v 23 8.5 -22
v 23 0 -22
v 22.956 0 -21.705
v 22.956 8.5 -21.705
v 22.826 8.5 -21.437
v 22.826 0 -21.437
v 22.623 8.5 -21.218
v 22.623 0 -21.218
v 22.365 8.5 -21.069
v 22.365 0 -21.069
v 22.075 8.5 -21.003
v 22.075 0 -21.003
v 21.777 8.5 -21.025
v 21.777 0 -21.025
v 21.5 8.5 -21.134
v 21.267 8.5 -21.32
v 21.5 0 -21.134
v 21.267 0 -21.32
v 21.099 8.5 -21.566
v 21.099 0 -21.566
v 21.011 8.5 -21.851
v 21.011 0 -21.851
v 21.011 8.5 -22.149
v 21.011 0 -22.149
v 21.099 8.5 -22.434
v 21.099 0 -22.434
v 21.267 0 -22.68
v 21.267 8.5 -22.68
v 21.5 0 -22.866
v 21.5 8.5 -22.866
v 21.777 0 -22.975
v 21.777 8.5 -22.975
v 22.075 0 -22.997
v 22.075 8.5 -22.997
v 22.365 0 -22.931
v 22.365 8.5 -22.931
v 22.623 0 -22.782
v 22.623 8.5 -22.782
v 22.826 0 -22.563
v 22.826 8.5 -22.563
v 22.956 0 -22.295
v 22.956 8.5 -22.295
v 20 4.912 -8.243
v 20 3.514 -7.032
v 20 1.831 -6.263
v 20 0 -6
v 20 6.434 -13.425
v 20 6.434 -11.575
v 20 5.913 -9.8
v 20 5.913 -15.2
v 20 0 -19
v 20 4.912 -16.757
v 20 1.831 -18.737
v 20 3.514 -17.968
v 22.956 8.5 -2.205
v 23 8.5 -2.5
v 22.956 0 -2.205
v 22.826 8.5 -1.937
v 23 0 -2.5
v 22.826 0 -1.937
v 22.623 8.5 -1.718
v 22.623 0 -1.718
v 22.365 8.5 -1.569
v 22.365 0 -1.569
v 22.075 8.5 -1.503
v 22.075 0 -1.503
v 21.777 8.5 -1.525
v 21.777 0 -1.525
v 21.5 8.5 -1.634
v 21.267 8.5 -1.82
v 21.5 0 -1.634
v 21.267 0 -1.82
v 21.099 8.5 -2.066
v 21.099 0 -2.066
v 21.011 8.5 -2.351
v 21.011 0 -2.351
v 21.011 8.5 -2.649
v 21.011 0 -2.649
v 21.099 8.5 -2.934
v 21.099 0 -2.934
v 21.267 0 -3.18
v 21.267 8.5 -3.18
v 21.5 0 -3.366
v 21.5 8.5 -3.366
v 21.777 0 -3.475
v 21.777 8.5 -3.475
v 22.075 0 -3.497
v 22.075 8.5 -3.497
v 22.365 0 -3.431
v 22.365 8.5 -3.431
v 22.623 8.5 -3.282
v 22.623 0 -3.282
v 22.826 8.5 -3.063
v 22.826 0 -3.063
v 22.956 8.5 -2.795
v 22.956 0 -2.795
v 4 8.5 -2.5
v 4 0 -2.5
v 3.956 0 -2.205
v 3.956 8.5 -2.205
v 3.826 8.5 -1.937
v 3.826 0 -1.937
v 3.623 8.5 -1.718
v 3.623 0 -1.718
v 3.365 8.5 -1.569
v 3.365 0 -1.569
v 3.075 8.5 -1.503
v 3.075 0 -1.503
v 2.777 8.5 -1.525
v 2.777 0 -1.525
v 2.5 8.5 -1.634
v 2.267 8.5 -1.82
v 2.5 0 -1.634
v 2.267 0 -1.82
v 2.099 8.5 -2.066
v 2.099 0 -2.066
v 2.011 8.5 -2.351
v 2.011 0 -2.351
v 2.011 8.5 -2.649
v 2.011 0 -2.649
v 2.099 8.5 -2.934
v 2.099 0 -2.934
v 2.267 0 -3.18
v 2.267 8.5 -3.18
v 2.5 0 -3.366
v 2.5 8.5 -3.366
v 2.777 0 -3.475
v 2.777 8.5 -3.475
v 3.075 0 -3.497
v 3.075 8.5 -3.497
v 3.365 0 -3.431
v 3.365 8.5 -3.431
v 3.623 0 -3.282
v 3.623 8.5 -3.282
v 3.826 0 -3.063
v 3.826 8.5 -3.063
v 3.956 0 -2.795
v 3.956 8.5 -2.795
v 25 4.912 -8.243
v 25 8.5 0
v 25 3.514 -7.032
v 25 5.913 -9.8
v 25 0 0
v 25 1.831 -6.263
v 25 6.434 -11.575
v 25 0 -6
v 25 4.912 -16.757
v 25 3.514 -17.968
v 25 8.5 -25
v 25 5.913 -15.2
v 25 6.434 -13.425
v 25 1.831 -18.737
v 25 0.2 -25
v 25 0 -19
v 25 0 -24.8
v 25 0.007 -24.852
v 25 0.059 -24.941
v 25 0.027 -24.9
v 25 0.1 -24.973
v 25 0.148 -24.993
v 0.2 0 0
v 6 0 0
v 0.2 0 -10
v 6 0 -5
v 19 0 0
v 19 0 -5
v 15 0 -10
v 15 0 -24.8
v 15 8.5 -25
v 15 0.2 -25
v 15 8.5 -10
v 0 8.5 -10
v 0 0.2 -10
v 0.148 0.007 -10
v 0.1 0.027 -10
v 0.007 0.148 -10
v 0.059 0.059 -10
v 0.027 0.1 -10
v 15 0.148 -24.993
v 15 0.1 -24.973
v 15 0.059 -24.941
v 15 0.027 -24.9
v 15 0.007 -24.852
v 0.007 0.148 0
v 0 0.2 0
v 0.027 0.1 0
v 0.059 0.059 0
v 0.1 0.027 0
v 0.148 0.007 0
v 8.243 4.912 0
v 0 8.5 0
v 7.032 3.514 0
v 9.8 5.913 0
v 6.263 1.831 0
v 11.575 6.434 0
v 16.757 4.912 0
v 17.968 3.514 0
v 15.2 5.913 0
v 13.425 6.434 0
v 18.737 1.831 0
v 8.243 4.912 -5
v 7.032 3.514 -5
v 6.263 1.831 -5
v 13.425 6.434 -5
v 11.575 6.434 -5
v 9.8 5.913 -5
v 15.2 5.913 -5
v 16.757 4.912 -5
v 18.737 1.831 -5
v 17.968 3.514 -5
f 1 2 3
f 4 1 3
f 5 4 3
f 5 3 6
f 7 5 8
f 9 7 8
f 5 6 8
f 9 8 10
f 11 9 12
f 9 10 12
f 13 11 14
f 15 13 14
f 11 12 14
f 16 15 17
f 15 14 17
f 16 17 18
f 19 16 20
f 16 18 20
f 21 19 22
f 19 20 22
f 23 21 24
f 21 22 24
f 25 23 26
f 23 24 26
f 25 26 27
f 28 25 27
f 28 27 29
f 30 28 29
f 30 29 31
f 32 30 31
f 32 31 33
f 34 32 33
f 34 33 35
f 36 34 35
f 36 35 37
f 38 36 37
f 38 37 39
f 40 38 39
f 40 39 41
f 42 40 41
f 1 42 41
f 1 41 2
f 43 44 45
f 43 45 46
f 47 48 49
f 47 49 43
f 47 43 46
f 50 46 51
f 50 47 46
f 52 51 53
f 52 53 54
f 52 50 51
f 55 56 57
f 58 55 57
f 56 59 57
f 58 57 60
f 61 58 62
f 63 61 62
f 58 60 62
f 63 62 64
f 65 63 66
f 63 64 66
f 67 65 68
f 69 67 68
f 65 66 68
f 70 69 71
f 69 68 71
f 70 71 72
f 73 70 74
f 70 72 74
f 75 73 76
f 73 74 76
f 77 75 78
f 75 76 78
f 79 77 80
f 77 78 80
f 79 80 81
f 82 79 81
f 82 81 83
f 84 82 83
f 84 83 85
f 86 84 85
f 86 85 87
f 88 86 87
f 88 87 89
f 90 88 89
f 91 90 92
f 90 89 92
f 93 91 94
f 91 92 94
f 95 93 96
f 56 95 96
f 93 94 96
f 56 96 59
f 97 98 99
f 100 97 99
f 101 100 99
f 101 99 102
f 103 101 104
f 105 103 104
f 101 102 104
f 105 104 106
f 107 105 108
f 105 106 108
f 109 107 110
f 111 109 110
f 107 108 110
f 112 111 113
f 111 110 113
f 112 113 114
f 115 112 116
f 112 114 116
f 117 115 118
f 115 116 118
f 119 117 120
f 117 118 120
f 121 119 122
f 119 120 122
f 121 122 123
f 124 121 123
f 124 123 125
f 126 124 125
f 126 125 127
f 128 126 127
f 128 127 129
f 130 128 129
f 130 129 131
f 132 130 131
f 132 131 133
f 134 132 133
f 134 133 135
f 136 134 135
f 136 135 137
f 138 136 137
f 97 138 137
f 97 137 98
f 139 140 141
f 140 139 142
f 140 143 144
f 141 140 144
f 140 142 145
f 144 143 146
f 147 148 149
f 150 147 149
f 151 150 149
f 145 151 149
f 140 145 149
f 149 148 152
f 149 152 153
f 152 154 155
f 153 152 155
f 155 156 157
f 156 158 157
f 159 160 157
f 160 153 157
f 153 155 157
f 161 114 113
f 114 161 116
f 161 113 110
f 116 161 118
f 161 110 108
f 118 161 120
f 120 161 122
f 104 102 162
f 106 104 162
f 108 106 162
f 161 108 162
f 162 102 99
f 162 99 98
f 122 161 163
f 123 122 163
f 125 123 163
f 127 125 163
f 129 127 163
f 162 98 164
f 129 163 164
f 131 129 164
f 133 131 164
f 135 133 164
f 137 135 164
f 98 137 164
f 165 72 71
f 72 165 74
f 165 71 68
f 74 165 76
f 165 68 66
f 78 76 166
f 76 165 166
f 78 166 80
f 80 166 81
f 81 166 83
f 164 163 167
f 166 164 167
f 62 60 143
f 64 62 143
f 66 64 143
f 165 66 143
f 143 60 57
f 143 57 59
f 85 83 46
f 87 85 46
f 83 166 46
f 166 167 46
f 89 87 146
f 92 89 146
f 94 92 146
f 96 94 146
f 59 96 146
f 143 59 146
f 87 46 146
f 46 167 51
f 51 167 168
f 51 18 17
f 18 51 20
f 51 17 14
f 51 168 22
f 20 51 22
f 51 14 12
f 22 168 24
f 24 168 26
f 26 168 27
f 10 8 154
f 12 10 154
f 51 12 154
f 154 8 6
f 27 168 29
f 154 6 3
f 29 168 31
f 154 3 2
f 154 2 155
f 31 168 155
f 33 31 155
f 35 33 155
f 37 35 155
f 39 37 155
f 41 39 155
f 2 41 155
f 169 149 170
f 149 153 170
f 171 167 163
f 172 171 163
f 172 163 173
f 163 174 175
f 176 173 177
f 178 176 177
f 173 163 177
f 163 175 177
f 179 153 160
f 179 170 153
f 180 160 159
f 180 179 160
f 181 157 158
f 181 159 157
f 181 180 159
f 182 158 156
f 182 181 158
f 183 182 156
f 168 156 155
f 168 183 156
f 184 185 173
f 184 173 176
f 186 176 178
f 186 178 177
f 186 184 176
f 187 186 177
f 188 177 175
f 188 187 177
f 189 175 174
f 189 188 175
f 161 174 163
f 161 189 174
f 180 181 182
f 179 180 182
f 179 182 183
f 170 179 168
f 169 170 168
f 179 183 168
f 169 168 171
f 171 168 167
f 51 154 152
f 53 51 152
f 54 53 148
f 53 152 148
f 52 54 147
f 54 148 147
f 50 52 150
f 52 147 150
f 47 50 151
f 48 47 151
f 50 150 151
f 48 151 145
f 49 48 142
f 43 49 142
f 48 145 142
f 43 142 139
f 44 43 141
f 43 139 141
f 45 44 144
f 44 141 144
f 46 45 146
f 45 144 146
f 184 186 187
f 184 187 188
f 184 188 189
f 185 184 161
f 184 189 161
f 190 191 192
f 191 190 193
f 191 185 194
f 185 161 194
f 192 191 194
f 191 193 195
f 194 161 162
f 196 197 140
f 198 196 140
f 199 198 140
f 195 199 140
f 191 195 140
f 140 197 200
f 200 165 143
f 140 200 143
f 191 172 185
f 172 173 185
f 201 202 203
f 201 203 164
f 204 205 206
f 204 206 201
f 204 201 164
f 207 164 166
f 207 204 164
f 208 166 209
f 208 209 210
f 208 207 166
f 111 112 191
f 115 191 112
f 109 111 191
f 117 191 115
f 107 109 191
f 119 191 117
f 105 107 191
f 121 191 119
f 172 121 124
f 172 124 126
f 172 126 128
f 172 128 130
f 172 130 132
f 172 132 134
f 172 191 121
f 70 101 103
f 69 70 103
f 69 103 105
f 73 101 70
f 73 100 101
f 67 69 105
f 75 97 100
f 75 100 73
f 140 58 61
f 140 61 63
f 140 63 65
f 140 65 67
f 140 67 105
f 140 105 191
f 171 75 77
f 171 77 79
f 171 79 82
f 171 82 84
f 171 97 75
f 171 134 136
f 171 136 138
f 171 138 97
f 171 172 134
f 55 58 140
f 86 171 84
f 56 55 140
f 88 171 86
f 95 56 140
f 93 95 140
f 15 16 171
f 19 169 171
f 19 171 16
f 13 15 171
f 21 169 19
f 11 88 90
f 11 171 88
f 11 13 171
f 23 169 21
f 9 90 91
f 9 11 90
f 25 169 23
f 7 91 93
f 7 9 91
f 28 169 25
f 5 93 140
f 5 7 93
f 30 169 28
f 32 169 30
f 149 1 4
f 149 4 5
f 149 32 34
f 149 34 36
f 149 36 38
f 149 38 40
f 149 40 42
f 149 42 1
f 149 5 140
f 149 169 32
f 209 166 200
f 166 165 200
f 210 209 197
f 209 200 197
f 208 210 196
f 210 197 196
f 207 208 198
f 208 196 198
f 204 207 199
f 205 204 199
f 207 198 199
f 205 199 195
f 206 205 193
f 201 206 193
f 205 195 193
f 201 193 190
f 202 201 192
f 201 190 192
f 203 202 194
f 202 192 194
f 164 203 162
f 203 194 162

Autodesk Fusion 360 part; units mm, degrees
sketch "Sketch1" plane through (0, 0, 0) normal (0, 1, 0) x (1, 0, 0)
  line L0 (0, 0) -> (25, 0)
  line L1 (25, 0) -> (25, 25)
  line L2 (25, 25) -> (15, 25)
  line L3 (0, 10) -> (0, 0)
  line L4 (15, 25) -> (15, 10)
  line L5 (15, 10) -> (0, 10)
  dimension "d13" = 25
  dimension "d14" = 25
  dimension "d15" = 15
extrude "Extrude1" add sketch "Sketch1" along normal blind 8.5
sketch "Sketch2" plane through (25, 0, 0) normal (1, 0, 0) x (0, 0, -1)
  line L0 (0, 0) -> (25, 0)
  line L1 (25, 0) -> (25, 8.5)
  line L2 (25, 8.5) -> (0, 8.5)
  line L3 (0, 8.5) -> (0, 0)
  arc A0 (19, 0) -> (6, 0) centre (12.5, 0) ccw
  line L4 (6, 0) -> (19, 0)
  dimension "d5" = 13
extrude "Extrude2" cut sketch "Sketch2" against normal blind 5 contours L0 A0 L4
sketch "Sketch3" plane through (0, 0, 0) normal (0, 0, 1) x (1, 0, 0)
  line L0 (0, 0) -> (25, 0)
  line L1 (25, 0) -> (25, 8.5)
  line L2 (25, 8.5) -> (0, 8.5)
  line L3 (0, 8.5) -> (0, 0)
  arc A0 (19, 0) -> (6, 0) centre (12.5, 0) ccw
  line L4 (6, 0) -> (19, 0)
  dimension "d8" = 13
extrude "Extrude3" cut sketch "Sketch3" against normal blind 5 contours L0 A0 L4
sketch "Sketch4" plane through (0, 0, 0) normal (0, -1, 0) x (1, 0, 0)
  line L0 (19, 0) -> (19, -5)
  line L1 (19, -5) -> (6, -5)
  line L2 (6, -5) -> (6, 0)
  line L3 (6, 0) -> (0, 0)
  line L4 (0, 0) -> (0, -10)
  line L5 (0, -10) -> (15, -10)
  line L6 (15, -10) -> (15, -25)
  line L7 (15, -25) -> (25, -25)
  line L8 (25, -25) -> (25, -19)
  line L9 (25, -19) -> (20, -19)
  line L10 (20, -19) -> (20, -6)
  line L11 (20, -6) -> (25, -6)
  line L12 (25, -6) -> (25, 0)
  line L13 (25, 0) -> (19, 0)
  circle A0 centre (3, -2.5) radius 1
  line L14 (0, -2.5) -> (25, -2.5) construction
  line L15 (22, 0) -> (22, -25) construction
  line L16 (25, -22) -> (24.6457, -22)
  line L17 (24.6457, -22) -> (15, -22) construction
  line L18 (3, 0) -> (3, -10) construction
  circle A1 centre (22, -22) radius 1
  circle A2 centre (22, -2.5) radius 1
  dimension "d16" = 2
extrude "Extrude4" cut sketch "Sketch4" against normal through all contours A0 | A1 | A2
fillet "Fillet1" radius 0.2 2 edges at (0, 0, -5) (20, 0, -25)
